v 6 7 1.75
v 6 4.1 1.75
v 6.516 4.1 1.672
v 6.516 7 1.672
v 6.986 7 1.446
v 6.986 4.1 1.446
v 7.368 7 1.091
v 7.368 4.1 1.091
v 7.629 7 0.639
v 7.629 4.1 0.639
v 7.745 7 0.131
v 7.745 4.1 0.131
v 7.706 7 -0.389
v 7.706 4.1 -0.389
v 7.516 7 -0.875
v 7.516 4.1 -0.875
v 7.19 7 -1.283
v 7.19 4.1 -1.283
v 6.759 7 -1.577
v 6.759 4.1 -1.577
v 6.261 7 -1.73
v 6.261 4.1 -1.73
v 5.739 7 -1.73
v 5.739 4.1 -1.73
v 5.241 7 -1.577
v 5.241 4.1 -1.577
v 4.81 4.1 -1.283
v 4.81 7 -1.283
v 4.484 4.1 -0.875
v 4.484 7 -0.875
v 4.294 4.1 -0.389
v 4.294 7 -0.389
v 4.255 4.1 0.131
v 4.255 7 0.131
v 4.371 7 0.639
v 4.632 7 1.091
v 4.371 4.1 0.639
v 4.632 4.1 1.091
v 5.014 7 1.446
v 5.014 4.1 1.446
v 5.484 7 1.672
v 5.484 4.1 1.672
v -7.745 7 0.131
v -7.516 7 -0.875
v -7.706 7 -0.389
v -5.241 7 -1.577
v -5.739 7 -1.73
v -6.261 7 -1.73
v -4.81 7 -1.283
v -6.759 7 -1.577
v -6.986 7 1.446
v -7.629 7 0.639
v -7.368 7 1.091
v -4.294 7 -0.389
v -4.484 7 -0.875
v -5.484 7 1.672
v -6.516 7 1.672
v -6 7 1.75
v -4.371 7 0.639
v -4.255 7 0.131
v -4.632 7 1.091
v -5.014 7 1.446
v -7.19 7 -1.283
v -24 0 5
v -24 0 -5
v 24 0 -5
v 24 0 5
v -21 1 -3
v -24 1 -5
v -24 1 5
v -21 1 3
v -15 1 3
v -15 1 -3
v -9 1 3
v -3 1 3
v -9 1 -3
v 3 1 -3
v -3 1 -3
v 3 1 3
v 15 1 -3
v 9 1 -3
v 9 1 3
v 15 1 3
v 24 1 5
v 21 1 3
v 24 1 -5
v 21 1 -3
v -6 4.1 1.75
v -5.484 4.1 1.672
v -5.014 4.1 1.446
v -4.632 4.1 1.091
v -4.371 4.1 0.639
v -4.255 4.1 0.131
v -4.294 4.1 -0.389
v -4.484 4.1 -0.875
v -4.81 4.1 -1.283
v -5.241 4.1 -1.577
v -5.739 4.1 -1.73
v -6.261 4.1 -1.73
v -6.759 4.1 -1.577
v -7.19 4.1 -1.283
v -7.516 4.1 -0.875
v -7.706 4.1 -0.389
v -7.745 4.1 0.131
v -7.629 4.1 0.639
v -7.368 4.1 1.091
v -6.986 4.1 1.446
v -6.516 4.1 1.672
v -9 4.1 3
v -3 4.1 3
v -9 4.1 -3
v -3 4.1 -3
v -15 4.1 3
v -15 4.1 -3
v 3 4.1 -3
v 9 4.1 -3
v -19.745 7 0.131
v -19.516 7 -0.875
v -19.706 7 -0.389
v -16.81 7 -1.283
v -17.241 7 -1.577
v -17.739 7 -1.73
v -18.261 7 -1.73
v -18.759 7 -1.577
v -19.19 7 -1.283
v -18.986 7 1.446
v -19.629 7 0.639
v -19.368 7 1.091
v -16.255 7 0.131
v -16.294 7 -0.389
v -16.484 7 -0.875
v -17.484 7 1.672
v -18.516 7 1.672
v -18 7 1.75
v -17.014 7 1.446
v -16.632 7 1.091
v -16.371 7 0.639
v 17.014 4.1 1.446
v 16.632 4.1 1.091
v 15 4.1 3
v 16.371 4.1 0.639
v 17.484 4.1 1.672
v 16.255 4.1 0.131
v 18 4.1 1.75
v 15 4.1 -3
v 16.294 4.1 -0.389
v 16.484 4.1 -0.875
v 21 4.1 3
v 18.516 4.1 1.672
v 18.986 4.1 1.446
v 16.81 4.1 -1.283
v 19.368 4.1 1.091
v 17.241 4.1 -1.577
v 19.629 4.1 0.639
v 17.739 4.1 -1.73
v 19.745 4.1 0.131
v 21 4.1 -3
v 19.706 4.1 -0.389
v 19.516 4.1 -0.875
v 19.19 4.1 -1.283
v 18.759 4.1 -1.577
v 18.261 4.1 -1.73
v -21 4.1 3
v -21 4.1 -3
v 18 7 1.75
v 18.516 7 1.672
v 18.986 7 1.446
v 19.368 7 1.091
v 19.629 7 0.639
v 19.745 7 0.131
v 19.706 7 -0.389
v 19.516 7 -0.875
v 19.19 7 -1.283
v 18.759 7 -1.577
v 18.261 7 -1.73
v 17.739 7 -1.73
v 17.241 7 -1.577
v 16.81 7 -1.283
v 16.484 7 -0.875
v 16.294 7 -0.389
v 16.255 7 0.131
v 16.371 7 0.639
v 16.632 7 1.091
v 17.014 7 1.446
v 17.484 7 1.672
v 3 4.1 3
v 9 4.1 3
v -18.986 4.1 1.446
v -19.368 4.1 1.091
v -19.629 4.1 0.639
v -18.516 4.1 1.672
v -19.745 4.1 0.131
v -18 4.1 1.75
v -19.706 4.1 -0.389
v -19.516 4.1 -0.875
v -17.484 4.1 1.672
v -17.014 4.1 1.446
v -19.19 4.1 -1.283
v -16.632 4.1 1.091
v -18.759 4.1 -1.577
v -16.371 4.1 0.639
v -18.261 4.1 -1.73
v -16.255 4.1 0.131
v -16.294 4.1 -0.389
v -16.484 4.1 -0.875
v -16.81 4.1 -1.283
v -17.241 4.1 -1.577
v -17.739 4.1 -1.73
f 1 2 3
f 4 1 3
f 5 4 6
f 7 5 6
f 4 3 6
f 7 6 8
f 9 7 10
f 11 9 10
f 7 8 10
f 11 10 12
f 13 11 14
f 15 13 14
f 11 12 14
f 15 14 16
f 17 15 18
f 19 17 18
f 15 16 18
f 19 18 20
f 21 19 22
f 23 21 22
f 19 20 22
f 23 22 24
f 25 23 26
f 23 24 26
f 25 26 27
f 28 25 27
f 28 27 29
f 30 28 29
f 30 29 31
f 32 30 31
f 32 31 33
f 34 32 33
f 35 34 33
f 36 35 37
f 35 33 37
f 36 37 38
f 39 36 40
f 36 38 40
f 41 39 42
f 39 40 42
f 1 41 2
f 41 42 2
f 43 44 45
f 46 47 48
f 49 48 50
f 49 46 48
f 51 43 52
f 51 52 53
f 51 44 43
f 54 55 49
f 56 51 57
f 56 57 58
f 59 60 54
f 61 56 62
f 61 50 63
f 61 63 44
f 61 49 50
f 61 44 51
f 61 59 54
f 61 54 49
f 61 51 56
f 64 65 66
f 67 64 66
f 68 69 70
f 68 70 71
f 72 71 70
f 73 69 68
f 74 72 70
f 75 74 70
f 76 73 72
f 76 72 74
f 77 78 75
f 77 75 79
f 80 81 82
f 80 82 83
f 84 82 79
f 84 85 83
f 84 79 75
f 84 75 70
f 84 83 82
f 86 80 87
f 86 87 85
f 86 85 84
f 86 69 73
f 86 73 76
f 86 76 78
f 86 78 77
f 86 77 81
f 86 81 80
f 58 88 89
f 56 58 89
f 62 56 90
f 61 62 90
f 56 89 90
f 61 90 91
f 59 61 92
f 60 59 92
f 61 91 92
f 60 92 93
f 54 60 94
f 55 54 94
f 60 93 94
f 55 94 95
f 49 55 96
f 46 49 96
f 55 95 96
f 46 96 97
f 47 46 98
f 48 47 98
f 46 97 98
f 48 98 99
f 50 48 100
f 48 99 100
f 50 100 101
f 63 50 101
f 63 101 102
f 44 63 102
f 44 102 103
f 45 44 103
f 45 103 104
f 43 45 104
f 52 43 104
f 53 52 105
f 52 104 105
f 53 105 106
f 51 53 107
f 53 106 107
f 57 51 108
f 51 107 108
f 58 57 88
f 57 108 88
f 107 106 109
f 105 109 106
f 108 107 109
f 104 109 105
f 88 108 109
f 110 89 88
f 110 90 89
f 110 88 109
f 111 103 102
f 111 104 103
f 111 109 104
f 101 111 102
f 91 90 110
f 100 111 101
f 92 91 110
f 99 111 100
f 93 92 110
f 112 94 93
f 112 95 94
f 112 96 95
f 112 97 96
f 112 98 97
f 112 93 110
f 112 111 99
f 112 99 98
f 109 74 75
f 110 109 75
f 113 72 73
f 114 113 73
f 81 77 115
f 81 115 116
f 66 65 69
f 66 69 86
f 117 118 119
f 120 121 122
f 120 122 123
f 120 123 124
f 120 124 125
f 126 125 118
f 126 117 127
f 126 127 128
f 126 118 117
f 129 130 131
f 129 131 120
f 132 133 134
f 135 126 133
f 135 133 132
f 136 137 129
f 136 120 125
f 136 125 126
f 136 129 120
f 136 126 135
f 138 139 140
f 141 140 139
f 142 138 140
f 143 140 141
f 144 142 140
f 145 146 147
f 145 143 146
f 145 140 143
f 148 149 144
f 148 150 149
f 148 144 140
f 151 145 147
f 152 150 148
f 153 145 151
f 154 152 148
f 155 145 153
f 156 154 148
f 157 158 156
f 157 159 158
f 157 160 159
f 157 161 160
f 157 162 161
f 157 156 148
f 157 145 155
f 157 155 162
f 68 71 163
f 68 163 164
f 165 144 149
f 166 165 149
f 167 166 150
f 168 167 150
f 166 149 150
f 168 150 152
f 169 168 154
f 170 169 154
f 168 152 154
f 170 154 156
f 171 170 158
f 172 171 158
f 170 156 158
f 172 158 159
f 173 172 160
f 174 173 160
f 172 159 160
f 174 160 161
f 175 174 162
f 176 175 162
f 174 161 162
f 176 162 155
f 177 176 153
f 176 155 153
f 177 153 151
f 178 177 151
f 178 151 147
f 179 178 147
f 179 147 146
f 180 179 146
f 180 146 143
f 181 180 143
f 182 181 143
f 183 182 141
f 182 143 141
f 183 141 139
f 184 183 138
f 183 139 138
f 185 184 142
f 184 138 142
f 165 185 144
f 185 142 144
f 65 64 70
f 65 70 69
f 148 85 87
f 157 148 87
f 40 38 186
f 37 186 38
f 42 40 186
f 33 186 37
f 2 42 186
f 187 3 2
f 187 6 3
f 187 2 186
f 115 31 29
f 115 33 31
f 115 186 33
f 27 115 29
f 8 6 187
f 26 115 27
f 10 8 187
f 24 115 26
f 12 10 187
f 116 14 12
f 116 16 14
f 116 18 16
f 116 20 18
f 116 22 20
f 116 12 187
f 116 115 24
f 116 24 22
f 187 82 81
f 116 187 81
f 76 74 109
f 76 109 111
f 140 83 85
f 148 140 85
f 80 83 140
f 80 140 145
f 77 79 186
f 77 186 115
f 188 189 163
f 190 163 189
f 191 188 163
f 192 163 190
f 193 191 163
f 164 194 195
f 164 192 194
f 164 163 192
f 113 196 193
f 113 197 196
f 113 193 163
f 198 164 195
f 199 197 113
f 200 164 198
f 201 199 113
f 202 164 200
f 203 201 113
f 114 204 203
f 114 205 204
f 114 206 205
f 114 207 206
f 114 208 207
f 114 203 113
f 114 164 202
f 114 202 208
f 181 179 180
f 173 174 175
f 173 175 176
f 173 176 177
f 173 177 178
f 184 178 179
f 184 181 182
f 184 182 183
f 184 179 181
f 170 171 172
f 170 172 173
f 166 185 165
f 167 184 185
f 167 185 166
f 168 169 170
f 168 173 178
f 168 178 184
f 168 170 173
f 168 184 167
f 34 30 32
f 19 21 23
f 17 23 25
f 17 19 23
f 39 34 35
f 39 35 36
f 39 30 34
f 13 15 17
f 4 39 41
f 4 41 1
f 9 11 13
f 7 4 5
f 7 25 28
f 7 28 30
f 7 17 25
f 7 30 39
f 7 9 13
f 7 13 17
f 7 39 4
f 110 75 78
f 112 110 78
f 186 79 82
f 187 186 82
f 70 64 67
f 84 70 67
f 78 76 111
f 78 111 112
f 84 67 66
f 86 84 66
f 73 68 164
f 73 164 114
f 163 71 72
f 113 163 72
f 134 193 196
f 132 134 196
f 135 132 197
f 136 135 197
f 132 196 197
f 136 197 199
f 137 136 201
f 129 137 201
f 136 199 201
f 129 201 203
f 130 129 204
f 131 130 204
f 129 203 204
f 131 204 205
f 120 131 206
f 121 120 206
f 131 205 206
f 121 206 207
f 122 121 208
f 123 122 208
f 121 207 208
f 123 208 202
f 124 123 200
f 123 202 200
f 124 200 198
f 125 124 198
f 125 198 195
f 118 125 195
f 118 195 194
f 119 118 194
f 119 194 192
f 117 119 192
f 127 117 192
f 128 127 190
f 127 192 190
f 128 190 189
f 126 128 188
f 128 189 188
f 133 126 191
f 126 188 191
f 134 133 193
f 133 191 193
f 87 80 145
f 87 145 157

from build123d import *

# Parameters (mm, degrees)
SKETCH1_W           = 48
SKETCH1_H           = 10
BOSS_EXTRUDE1_DEPTH = 1
SKETCH2_W           = 6
SKETCH2_H           = 6
BOSS_EXTRUDE2_DEPTH = 3
SKETCH2_2_W         = 6
SKETCH2_2_H         = 6
BOSS_EXTRUDE3_DEPTH = 3.1
SKETCH4_R           = 1.75
BOSS_EXTRUDE4_DEPTH = 2.9


with BuildPart() as part:
    # Sketch1 → Boss-Extrude1 (new body)
    with BuildSketch(Plane(origin=(0, 0, 0), x_dir=(1, 0, 0), z_dir=(0, 1, 0))):
        Rectangle(SKETCH1_W, SKETCH1_H)
    extrude(amount=BOSS_EXTRUDE1_DEPTH)

    # Sketch2 → Boss-Extrude2 (add)
    with BuildSketch(Plane(origin=(0, 1, 0), x_dir=(1, 0, 0), z_dir=(0, 1, 0))):
        with Locations((-6, 0)):
            Rectangle(SKETCH2_W, SKETCH2_H)
        with Locations((-18, 0)):
            Rectangle(SKETCH2_W, SKETCH2_H)
        with Locations((6, 0)):
            Rectangle(SKETCH2_W, SKETCH2_H)
        with Locations((18, 0)):
            Rectangle(SKETCH2_W, SKETCH2_H)
    extrude(amount=BOSS_EXTRUDE2_DEPTH)

    # Sketch2<2> → Boss-Extrude3 (add)
    with BuildSketch(Plane(origin=(0, 1, 0), x_dir=(1, 0, 0), z_dir=(0, 1, 0))):
        with Locations((-6, 0)):
            Rectangle(SKETCH2_2_W, SKETCH2_2_H)
        with Locations((-18, 0)):
            Rectangle(SKETCH2_2_W, SKETCH2_2_H)
        with Locations((6, 0)):
            Rectangle(SKETCH2_2_W, SKETCH2_2_H)
        with Locations((18, 0)):
            Rectangle(SKETCH2_2_W, SKETCH2_2_H)
    extrude(amount=BOSS_EXTRUDE3_DEPTH)

    # Sketch4 → Boss-Extrude4 (add)
    with BuildSketch(Plane(origin=(0, 4.1, 0), x_dir=(1, 0, 0), z_dir=(0, 1, 0))):
        with Locations((-18, 0)):
            Circle(SKETCH4_R)
        with Locations((-6, 0)):
            Circle(SKETCH4_R)
        with Locations((6, 0)):
            Circle(SKETCH4_R)
        with Locations((18, 0)):
            Circle(SKETCH4_R)
    extrude(amount=BOSS_EXTRUDE4_DEPTH)


solid = part.part
